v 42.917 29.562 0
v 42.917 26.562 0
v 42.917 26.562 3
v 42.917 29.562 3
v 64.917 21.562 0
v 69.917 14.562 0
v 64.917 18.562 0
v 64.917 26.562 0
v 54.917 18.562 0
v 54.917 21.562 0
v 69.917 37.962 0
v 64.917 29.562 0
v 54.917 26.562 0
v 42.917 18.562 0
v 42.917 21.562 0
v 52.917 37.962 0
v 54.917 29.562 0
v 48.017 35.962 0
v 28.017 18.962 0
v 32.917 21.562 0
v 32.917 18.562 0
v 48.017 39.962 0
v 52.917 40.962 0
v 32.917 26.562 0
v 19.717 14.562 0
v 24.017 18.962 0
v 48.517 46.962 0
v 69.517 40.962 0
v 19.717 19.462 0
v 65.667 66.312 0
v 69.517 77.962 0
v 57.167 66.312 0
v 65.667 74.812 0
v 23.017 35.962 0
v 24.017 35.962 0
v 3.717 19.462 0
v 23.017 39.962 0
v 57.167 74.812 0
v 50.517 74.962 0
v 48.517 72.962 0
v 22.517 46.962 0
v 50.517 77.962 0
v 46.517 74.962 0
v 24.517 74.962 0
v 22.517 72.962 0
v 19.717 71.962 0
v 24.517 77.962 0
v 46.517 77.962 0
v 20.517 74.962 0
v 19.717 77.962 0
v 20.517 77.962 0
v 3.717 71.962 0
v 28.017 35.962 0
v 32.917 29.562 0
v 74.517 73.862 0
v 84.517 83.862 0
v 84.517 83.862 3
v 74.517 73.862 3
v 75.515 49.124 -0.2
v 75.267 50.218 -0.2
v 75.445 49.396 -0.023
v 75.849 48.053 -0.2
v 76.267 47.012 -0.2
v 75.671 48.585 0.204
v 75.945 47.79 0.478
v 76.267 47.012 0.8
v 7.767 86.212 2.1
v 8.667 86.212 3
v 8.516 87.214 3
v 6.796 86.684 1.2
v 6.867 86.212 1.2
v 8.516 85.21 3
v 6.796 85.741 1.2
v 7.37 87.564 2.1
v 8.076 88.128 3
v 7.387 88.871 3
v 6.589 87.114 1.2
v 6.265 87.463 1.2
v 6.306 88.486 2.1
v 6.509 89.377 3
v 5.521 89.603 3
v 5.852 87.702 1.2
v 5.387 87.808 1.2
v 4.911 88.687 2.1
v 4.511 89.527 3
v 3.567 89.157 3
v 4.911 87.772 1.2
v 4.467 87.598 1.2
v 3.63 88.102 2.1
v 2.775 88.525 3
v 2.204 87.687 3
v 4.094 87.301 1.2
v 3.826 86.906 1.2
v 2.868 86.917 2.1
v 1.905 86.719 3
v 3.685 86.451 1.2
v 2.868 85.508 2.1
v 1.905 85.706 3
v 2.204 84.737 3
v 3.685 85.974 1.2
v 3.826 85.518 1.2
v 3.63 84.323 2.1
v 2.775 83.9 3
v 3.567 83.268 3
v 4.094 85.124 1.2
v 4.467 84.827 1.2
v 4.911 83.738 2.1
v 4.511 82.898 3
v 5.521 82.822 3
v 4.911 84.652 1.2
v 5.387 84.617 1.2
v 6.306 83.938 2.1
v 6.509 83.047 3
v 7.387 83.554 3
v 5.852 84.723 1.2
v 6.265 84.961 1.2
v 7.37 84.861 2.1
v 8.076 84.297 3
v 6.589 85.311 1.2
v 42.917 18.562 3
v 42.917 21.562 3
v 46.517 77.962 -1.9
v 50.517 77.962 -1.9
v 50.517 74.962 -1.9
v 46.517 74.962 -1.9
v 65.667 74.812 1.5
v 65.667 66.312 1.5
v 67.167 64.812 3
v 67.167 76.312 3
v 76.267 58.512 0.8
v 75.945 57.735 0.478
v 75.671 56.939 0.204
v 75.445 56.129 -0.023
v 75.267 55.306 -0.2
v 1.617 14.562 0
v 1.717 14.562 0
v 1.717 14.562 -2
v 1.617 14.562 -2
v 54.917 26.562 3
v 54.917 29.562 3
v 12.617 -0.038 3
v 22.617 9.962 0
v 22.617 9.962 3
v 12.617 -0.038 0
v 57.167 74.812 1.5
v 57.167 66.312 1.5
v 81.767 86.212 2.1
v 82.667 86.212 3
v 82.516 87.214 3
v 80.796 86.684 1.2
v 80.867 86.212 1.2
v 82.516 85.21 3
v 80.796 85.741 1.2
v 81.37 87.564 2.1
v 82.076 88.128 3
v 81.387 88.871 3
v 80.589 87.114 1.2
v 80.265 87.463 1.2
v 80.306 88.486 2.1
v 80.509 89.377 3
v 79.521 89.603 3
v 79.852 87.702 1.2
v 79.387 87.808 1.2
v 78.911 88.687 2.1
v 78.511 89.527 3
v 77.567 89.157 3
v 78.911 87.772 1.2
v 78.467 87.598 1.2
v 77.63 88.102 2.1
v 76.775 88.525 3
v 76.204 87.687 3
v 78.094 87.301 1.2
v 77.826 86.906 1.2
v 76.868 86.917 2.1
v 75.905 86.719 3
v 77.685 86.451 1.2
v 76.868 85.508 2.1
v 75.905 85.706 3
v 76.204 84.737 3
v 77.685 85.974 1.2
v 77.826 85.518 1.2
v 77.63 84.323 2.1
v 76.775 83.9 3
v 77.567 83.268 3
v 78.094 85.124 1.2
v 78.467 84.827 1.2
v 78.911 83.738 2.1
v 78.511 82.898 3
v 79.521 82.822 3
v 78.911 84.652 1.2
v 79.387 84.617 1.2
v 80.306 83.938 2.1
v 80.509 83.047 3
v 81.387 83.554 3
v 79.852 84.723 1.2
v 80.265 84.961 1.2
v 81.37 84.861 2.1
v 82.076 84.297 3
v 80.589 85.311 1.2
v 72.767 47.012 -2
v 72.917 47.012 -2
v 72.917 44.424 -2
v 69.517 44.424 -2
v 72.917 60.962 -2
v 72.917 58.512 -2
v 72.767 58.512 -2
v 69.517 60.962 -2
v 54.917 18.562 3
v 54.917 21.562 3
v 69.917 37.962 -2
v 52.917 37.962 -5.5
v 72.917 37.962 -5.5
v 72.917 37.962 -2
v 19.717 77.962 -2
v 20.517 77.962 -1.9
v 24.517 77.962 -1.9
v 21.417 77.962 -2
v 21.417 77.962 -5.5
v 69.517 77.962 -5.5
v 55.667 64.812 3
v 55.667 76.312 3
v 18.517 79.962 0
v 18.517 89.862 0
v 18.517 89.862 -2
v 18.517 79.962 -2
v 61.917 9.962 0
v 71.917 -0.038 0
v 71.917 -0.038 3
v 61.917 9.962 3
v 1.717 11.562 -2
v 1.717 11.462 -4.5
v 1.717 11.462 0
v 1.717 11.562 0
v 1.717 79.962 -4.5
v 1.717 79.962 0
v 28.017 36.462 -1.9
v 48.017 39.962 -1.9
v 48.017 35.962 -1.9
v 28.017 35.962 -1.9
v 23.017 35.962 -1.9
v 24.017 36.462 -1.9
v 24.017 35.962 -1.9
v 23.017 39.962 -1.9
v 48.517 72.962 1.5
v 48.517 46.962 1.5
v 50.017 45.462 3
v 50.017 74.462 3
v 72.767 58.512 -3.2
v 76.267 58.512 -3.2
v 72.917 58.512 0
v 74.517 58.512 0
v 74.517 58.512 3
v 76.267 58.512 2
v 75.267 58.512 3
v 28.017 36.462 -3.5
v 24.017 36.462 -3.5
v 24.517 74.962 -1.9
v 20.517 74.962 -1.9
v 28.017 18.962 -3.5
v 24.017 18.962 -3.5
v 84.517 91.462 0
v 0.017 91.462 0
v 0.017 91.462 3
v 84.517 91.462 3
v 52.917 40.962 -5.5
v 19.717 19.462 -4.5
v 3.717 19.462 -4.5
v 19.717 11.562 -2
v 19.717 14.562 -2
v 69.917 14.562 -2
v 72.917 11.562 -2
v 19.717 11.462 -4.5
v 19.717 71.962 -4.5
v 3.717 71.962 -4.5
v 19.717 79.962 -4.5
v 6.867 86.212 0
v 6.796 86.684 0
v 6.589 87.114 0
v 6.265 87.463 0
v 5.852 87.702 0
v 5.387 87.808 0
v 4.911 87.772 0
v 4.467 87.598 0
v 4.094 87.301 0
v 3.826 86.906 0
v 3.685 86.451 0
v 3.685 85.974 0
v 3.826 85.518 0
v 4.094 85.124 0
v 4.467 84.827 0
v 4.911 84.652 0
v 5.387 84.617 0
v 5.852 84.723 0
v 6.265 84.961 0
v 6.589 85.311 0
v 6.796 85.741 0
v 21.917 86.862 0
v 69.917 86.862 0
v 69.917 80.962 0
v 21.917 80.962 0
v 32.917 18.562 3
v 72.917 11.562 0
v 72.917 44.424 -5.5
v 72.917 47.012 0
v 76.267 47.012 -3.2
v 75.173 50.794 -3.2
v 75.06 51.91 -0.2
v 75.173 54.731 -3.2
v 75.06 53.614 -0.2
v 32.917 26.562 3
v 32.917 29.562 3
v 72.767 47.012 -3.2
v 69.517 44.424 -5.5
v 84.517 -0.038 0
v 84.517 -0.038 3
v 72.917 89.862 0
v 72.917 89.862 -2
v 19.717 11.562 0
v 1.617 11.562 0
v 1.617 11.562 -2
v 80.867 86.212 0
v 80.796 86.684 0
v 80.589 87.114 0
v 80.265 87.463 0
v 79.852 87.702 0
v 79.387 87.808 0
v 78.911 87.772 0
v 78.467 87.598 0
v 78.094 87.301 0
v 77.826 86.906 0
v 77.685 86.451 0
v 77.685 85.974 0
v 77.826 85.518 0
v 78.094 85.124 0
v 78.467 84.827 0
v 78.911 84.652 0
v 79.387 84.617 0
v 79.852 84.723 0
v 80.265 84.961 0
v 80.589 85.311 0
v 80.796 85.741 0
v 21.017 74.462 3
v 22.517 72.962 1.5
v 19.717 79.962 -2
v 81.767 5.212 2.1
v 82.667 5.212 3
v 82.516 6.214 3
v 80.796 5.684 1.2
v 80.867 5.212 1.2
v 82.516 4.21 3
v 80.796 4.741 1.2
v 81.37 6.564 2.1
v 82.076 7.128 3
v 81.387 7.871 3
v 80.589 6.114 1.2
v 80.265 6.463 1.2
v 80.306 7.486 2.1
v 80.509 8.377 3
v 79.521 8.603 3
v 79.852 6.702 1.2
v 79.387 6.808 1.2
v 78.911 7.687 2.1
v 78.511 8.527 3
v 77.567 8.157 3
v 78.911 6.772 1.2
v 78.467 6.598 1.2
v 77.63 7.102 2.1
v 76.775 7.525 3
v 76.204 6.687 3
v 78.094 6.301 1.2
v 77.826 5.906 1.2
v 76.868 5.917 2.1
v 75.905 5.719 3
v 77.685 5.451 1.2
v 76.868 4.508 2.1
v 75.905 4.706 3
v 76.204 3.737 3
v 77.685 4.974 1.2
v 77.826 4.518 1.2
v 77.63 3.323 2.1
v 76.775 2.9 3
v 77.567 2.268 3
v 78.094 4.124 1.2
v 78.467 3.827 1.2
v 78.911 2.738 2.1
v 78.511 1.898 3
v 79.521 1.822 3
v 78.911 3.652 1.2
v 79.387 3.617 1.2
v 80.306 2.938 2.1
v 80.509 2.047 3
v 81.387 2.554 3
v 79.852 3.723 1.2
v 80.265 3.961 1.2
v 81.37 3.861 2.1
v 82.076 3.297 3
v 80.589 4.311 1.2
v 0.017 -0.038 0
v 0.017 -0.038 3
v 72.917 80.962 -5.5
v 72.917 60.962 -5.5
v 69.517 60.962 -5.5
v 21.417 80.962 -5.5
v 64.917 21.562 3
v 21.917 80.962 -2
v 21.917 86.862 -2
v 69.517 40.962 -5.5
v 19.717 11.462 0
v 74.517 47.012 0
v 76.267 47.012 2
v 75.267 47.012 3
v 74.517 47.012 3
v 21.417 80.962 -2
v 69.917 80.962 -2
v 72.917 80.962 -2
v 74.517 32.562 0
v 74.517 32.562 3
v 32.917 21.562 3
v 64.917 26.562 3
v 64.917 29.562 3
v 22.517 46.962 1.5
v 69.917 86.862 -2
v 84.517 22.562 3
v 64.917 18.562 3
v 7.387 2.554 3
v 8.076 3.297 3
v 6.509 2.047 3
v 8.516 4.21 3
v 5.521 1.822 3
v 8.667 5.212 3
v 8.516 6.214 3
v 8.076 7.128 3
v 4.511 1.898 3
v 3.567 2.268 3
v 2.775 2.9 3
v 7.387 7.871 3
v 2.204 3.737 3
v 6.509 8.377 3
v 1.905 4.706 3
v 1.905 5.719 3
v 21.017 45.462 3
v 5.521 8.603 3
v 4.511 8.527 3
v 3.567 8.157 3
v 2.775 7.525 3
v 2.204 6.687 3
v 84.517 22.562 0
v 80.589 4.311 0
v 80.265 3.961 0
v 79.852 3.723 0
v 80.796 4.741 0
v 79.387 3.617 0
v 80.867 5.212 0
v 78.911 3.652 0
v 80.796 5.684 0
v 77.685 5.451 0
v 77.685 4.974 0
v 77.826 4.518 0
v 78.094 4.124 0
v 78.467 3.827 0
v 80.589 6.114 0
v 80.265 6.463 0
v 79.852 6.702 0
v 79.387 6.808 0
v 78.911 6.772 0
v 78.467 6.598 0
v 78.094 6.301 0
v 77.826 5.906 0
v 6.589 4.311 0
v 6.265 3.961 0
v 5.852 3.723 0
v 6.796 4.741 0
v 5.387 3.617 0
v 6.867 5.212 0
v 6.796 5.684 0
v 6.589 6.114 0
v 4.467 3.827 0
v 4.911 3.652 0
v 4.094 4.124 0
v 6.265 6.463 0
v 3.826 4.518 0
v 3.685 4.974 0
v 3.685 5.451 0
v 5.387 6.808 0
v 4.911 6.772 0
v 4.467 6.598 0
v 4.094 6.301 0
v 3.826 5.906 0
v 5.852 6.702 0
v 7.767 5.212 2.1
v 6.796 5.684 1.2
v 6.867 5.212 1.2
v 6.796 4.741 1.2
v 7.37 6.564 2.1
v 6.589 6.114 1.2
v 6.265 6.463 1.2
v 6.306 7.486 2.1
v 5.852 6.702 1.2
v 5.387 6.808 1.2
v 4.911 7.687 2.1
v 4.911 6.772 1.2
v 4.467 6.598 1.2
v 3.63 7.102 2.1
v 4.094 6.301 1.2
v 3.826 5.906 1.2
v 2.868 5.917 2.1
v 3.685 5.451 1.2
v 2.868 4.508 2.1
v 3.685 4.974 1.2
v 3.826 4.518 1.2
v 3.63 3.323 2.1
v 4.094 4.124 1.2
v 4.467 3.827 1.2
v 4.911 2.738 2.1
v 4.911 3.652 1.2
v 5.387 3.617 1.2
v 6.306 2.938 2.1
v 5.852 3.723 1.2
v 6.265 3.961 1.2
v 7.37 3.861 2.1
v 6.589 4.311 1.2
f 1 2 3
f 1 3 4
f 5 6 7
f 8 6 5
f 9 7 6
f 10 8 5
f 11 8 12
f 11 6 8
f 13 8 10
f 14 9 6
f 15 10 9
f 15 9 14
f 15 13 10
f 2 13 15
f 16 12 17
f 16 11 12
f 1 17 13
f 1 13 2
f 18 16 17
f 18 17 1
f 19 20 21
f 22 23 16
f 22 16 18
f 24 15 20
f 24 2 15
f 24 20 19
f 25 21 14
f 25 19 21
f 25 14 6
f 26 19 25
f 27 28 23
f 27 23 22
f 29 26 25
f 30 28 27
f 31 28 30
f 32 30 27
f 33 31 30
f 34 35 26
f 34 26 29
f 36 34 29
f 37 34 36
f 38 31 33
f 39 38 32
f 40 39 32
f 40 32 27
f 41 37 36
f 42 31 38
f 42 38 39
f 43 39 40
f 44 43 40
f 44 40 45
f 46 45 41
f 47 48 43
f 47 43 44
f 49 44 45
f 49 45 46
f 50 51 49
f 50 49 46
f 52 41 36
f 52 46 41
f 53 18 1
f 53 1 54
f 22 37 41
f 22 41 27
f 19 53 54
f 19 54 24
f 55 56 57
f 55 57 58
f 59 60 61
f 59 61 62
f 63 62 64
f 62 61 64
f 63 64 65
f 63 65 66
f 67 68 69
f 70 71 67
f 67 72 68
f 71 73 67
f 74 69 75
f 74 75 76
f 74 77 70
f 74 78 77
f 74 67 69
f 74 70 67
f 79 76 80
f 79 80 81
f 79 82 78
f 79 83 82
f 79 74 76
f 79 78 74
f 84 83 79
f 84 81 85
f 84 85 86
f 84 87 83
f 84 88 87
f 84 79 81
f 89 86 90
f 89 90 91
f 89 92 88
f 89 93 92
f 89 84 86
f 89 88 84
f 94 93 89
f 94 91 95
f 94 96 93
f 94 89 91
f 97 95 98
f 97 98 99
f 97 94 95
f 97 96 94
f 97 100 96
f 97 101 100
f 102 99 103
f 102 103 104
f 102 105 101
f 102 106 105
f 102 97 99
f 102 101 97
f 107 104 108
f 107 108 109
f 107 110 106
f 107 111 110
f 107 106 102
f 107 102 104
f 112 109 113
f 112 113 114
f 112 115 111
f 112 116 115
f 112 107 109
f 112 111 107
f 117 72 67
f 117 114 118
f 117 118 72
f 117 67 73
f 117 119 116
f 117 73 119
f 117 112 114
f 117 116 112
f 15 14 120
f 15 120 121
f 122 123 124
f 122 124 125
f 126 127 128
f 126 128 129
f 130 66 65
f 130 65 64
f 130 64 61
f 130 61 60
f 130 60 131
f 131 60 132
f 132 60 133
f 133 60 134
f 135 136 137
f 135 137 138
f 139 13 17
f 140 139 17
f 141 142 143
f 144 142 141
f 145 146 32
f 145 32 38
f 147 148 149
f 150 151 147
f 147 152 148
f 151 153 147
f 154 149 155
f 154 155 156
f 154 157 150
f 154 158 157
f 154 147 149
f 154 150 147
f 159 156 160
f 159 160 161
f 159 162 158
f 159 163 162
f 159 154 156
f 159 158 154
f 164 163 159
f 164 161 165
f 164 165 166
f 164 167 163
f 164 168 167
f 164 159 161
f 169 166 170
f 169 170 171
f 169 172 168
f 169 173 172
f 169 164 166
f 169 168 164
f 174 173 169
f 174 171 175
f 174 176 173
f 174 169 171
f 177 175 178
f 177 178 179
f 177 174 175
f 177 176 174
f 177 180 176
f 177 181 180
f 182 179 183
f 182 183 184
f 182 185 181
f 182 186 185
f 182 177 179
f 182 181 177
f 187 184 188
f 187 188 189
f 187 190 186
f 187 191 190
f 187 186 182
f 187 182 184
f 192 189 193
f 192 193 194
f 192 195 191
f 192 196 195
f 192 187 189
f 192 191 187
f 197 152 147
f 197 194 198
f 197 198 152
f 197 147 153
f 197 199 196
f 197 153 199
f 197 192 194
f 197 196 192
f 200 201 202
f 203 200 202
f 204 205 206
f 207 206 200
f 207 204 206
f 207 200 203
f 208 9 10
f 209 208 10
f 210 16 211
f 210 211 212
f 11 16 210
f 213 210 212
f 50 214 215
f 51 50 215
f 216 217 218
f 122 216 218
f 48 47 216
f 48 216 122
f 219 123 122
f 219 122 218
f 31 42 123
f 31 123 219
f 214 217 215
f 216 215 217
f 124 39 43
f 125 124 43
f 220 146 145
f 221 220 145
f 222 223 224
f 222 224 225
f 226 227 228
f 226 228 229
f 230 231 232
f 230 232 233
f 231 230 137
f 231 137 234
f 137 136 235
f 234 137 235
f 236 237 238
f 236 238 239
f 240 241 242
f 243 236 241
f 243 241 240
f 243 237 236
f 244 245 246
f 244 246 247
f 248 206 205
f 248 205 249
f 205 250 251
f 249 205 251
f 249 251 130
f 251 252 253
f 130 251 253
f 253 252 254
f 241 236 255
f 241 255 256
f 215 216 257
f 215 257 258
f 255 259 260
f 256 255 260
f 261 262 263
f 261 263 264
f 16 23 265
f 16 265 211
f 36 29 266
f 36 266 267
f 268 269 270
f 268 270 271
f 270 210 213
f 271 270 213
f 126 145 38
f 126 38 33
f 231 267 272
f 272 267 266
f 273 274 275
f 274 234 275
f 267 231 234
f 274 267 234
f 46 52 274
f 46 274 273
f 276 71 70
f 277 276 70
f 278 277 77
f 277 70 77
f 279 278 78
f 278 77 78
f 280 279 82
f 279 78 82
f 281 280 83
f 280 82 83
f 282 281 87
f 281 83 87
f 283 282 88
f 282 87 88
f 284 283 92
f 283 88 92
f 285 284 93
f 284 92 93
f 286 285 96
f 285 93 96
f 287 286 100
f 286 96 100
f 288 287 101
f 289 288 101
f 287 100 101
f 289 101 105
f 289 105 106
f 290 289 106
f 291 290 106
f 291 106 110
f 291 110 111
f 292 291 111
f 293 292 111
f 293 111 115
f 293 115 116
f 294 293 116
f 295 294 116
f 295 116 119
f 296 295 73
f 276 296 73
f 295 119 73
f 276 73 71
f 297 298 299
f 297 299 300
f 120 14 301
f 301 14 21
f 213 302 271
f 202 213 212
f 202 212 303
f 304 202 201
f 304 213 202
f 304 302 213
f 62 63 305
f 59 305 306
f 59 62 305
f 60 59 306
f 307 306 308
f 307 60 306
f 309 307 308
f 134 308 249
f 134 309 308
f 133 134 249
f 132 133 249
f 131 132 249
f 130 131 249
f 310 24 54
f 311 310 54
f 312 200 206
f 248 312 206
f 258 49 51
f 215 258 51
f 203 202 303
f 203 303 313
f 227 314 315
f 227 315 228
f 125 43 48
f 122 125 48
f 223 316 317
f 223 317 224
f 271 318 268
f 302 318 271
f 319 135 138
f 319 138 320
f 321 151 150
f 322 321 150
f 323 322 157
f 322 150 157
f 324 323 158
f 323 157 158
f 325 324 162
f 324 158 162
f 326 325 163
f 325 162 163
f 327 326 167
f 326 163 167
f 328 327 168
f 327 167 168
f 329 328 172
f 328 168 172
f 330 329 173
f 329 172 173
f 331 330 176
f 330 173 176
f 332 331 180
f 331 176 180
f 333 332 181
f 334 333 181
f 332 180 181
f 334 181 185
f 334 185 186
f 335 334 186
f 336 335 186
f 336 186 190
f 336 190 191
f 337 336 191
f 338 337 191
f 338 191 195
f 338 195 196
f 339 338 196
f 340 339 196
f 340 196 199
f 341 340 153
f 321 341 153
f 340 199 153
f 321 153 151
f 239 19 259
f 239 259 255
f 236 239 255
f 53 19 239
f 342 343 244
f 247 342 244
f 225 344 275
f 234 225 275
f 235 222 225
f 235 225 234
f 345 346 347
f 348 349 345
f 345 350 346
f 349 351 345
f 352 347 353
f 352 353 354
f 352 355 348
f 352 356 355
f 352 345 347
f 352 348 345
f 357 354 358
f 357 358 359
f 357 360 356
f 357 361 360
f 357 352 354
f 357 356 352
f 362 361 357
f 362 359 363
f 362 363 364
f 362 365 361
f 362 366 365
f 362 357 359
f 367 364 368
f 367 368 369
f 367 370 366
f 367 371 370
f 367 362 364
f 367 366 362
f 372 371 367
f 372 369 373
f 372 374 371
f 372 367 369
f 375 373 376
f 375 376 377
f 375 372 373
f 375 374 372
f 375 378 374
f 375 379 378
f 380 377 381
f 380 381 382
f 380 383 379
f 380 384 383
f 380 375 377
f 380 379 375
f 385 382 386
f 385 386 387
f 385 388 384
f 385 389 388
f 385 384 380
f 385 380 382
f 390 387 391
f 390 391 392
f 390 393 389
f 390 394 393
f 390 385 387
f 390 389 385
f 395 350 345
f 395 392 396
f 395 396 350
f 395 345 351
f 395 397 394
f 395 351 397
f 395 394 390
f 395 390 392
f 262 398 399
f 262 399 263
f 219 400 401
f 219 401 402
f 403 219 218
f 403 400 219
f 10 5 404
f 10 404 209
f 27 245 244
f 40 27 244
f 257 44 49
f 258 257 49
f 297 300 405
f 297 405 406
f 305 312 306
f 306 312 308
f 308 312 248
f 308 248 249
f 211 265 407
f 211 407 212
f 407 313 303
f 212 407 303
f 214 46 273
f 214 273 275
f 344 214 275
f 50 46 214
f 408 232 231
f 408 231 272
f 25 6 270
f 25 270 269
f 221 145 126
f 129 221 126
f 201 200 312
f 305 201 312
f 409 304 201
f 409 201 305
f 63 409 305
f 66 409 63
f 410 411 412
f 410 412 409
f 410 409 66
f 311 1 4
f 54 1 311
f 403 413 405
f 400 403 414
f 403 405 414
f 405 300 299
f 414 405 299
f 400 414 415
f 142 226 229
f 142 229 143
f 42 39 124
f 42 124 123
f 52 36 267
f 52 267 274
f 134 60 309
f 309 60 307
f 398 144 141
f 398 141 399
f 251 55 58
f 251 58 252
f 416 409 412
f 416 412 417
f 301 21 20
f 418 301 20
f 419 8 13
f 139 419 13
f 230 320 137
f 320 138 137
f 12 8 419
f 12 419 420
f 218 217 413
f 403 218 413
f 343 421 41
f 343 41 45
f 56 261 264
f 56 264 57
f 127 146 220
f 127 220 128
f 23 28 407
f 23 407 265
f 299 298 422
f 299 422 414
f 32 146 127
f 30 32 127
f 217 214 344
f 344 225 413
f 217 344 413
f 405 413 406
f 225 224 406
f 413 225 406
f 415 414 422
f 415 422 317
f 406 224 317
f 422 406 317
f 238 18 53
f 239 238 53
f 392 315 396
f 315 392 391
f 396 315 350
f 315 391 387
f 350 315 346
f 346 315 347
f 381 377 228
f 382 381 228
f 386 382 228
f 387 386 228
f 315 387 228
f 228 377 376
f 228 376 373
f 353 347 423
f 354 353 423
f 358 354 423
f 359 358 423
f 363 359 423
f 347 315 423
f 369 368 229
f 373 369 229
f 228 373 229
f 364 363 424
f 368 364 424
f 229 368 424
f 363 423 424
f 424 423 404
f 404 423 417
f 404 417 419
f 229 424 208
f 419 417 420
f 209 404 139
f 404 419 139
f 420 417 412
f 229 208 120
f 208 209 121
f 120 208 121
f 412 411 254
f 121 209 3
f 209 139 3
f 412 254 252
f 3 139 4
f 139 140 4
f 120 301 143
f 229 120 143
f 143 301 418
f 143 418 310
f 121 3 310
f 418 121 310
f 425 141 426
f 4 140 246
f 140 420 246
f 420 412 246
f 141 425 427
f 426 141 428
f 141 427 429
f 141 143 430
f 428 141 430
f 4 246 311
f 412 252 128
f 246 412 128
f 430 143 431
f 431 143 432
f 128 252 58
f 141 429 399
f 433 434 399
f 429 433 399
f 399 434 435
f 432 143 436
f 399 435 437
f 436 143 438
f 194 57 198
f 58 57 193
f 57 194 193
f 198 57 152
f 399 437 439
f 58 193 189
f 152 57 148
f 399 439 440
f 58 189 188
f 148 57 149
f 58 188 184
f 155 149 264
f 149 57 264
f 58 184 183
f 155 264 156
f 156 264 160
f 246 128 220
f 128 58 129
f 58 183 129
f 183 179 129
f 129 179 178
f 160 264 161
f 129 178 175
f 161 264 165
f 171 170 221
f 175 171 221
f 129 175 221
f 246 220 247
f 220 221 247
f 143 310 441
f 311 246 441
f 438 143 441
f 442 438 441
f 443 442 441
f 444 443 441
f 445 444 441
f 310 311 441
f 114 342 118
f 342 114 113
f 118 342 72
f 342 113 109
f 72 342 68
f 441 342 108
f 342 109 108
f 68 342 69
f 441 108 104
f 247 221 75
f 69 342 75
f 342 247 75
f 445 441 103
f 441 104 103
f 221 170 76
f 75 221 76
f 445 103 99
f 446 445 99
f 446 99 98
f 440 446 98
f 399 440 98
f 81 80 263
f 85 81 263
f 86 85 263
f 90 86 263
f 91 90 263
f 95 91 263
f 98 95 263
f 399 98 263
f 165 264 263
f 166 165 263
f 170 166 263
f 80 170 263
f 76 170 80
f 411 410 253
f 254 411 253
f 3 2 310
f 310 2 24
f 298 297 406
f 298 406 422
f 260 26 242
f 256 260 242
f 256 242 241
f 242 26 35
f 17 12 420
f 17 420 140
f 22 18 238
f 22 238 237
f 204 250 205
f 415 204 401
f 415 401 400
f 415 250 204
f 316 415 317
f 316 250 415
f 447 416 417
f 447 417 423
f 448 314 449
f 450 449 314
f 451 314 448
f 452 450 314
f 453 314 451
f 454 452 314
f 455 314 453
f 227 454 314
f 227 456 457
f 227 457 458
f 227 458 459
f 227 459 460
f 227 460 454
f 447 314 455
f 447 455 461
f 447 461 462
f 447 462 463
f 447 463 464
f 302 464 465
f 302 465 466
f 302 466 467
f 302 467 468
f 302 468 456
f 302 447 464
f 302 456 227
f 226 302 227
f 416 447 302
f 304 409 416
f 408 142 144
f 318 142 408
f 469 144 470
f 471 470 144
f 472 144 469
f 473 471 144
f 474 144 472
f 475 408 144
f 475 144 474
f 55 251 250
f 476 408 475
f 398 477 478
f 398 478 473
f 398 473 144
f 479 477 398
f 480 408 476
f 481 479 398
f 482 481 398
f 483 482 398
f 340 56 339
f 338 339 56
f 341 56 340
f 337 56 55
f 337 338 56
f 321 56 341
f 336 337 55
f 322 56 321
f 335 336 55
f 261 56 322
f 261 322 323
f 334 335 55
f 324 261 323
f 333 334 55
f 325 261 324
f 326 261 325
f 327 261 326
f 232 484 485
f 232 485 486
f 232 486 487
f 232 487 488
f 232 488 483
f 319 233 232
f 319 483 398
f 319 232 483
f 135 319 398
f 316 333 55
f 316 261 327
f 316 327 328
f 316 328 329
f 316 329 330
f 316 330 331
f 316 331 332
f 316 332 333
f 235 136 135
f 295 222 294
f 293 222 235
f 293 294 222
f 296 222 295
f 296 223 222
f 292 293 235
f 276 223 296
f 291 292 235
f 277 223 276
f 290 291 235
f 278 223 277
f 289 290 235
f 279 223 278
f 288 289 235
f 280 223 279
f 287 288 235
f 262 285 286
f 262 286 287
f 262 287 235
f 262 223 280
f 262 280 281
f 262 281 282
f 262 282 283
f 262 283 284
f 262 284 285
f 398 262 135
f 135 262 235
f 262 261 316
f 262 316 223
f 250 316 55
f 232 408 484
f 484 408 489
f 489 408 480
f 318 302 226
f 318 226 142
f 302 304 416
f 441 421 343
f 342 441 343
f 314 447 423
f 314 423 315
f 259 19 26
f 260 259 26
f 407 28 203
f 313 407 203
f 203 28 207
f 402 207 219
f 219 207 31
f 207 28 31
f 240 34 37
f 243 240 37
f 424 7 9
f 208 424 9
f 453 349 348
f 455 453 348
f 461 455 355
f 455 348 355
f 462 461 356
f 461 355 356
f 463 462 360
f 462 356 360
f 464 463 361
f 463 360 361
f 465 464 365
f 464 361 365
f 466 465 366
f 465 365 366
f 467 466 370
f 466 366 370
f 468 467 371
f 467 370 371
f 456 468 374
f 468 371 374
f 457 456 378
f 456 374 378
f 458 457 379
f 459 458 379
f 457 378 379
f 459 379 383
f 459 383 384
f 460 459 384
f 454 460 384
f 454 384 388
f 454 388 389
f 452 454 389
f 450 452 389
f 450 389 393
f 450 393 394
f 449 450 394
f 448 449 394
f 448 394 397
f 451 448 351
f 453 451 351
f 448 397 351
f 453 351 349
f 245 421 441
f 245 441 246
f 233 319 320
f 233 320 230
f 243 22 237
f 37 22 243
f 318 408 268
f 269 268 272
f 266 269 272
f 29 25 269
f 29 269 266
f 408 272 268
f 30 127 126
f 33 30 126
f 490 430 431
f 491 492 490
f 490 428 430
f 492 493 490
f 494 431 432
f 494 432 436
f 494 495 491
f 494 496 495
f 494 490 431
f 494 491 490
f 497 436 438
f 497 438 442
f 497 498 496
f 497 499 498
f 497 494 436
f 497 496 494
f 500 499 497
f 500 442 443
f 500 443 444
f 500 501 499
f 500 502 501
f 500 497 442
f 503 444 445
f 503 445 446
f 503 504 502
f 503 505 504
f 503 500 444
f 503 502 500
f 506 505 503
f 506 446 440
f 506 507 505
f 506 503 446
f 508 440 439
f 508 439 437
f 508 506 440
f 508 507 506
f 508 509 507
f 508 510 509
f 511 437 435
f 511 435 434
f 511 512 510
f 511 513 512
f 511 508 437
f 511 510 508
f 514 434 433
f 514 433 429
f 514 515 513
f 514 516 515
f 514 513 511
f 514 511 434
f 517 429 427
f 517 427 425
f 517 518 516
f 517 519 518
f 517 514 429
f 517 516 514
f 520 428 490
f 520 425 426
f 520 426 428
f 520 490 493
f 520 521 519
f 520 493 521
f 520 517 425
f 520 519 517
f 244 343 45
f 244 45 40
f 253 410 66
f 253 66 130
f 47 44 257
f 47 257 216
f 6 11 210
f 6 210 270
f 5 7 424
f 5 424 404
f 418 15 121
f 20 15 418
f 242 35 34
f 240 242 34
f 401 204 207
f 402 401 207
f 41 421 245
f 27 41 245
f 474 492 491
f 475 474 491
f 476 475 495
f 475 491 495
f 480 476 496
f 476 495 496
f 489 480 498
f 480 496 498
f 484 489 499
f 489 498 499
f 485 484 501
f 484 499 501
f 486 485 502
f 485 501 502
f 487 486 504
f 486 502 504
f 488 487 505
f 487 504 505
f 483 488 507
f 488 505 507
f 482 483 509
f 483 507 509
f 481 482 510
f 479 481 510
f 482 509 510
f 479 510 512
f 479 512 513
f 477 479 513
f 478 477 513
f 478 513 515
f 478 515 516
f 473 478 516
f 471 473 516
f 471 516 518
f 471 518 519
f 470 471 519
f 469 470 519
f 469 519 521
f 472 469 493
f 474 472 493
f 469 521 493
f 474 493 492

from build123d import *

# Parameters (mm, degrees)
BOSS_EXTRUDE1_DEPTH     = 3
SKETCH3_R               = 1.6
CUT_EXTRUDE1_DEPTH      = 3
CHAMFER1_SIZE           = 1.8
SKETCH5_W               = 26
SKETCH5_H               = 26
SKETCH5_W_2             = 8.5
SKETCH5_H_2             = 8.5
CUT_EXTRUDE2_DEPTH      = 3
CHAMFER2_SIZE           = 1.5
SKETCH7_W               = 3.5
SKETCH7_H               = 11.5
BOSS_EXTRUDE3_DEPTH     = 6.2
CUT_EXTRUDE3_DEPTH      = 125.687357779
CUT_EXTRUDE3_DEPTH_BACK = 3
CHAMFER3_SIZE           = 1
SKETCH9_W               = 25
SKETCH9_H               = 4
SKETCH9_W_2             = 4
SKETCH9_H_2             = 5
BOSS_EXTRUDE4_DEPTH     = 1.9
BOSS_EXTRUDE5_DEPTH     = 5.5
SKETCH11_W              = 4
SKETCH11_H              = 17.5
BOSS_EXTRUDE6_DEPTH     = 3.5
BOSS_EXTRUDE7_DEPTH     = 4.5
SKETCH13_W              = 3.4
SKETCH13_H              = 16.58647312
BOSS_EXTRUDE8_DEPTH     = 2
SKETCH14_W              = 10
SKETCH14_H              = 3
CUT_EXTRUDE4_DEPTH      = 3
CHAMFER4_SIZE           = 1


with BuildPart() as part:
    # Sketch1 → Boss-Extrude1 (new body)
    with BuildSketch(Plane.XY):
        Polygon((0.01715505, 91.462274694), (84.51715505, 91.462274694), (84.51715505, 83.862274694), (74.51715505, 73.862274694), (74.51715505, 32.562274694), (84.51715505, 22.562274694), (84.51715505, -0.037725306), (71.91715505, -0.037725306), (61.91715505, 9.962274694), (22.61715505, 9.962274694), (12.61715505, -0.037725306), (0.01715505, -0.037725306), align=None)
    extrude(amount=BOSS_EXTRUDE1_DEPTH)

    # Sketch3 → Cut-Extrude1 (cut)
    with BuildSketch(Plane.XY.offset(3)):
        with Locations((5.26715505, 86.212274694)):
            Circle(SKETCH3_R)
        with Locations((79.26715505, 86.212274694)):
            Circle(SKETCH3_R)
        with Locations((5.26715505, 5.212274694)):
            Circle(SKETCH3_R)
        with Locations((79.26715505, 5.212274694)):
            Circle(SKETCH3_R)
    extrude(amount=-CUT_EXTRUDE1_DEPTH, mode=Mode.SUBTRACT)

    # Chamfer1
    chamfer1_edges = [part.edges().sort_by_distance(p)[0] for p in [
        (77.66715505, 86.212274694, 3),
        (3.66715505, 5.212274694, 3),
        (77.66715505, 5.212274694, 3),
        (3.66715505, 86.212274694, 3),
    ]]
    chamfer(chamfer1_edges, length=CHAMFER1_SIZE)

    # Sketch5 → Cut-Extrude2 (cut)
    with BuildSketch(Plane.XY.offset(3)):
        with Locations((35.51715505, 59.962274694)):
            Rectangle(SKETCH5_W, SKETCH5_H)
        with Locations((61.41715505, 70.562274694)):
            Rectangle(SKETCH5_W_2, SKETCH5_H_2)
    extrude(amount=-CUT_EXTRUDE2_DEPTH, mode=Mode.SUBTRACT)

    # Chamfer2
    chamfer2_edges = [part.edges().sort_by_distance(p)[0] for p in [
        (57.16715505, 70.562274694, 3),
        (61.41715505, 66.312274694, 3),
        (65.66715505, 70.562274694, 3),
        (61.41715505, 74.812274694, 3),
        (22.51715505, 59.962274694, 3),
        (35.51715505, 46.962274694, 3),
        (48.51715505, 59.962274694, 3),
        (35.51715505, 72.962274694, 3),
    ]]
    chamfer(chamfer2_edges, length=CHAMFER2_SIZE)

    # Sketch7 → Boss-Extrude3 (add)
    with BuildSketch(Plane.XY.offset(3)):
        with Locations((74.51715505, 52.762274694)):
            Rectangle(SKETCH7_W, SKETCH7_H)
    extrude(amount=-BOSS_EXTRUDE3_DEPTH)

    # Sketch8 → Cut-Extrude3 (cut, two sides: drawn at the far end of the back side and taken through both)
    with BuildSketch(Plane(origin=(0, 0, -3.2), x_dir=(-1, 0, 0), z_dir=(0, 0, -1)).offset(-CUT_EXTRUDE3_DEPTH_BACK)):
        with BuildLine():
            Line((-76.26715505, 58.512274694), (-76.26715505, 47.012274694))
            ThreePointArc((-76.26715505, 47.012274694), (-75.034557132, 52.762274694), (-76.26715505, 58.512274694))
        make_face()
    extrude(amount=CUT_EXTRUDE3_DEPTH + CUT_EXTRUDE3_DEPTH_BACK, mode=Mode.SUBTRACT)

    # Chamfer3
    # the kernel refuses this chamfer: 1 mm, written as the material it takes off along each edge
    with BuildSketch(Plane(origin=(76.26715505, 61.083957682, -0.2), x_dir=(0.02749587661058217, 0, 0.9996219169112968), z_dir=(0, -1, 0))) as chamfer3_piece_1_section:
        Polygon((CHAMFER3_SIZE * 0.999621916911, CHAMFER3_SIZE * 0.0274958766106), (-CHAMFER3_SIZE * 0.0274958766106, CHAMFER3_SIZE * 0.999621916911), (0, 0), align=None)
    chamfer3_piece_1 = extrude(amount=16.643365976, mode=Mode.PRIVATE)
    chamfer3_piece_1 = chamfer3_piece_1 & Plane(origin=(89.06256948, 52.762274694, 0.149616296), x_dir=(-0.9121331028647569, -0.4098941359159838, 0), z_dir=(0, 0, 1)) * Cylinder(14.028012348, 38, mode=Mode.PRIVATE)
    add(chamfer3_piece_1, mode=Mode.SUBTRACT)

    # Sketch9 → Boss-Extrude4 (add)
    with BuildSketch(Plane(origin=(0, 0, 0), x_dir=(-1, 0, 0), z_dir=(0, 0, -1))):
        with Locations((-35.51715505, 37.962274694)):
            Rectangle(SKETCH9_W, SKETCH9_H)
        with Locations((-48.51715505, 77.462274694)):
            Rectangle(SKETCH9_W_2, SKETCH9_H_2)
        with Locations((-22.51715505, 77.462274694)):
            Rectangle(SKETCH9_W_2, SKETCH9_H_2)
    extrude(amount=BOSS_EXTRUDE4_DEPTH)

    # Sketch10 → Boss-Extrude5 (add)
    with BuildSketch(Plane(origin=(0, 0, 0), x_dir=(-1, 0, 0), z_dir=(0, 0, -1))):
        Polygon((-21.41715505, 80.962274694), (-72.91715505, 80.962274694), (-72.91715505, 60.962274694), (-69.51715505, 60.962274694), (-69.51715505, 77.962274694), (-21.41715505, 77.962274694), align=None)
        Polygon((-72.91715505, 44.424333564), (-69.51715505, 44.424333564), (-69.51715505, 40.962274694), (-52.91715505, 40.962274694), (-52.91715505, 37.962274694), (-72.91715505, 37.962274694), align=None)
    extrude(amount=BOSS_EXTRUDE5_DEPTH)

    # Sketch11 → Boss-Extrude6 (add)
    with BuildSketch(Plane(origin=(0, 0, 0), x_dir=(-1, 0, 0), z_dir=(0, 0, -1))):
        with Locations((-26.01715505, 27.712274694)):
            Rectangle(SKETCH11_W, SKETCH11_H)
    extrude(amount=BOSS_EXTRUDE6_DEPTH)

    # Sketch12 → Boss-Extrude7 (add)
    with BuildSketch(Plane(origin=(0, 0, 0), x_dir=(-1, 0, 0), z_dir=(0, 0, -1))):
        Polygon((-19.71715505, 79.962274694), (-1.71715505, 79.962274694), (-1.71715505, 72.462274694), (-1.71715505, 19.462274694), (-1.71715505, 11.462274694), (-19.71715505, 11.462274694), (-19.71715505, 19.462274694), (-3.71715505, 19.462274694), (-3.71715505, 71.962274694), (-19.71715505, 71.962274694), align=None)
    extrude(amount=BOSS_EXTRUDE7_DEPTH)

    # Sketch13 → Boss-Extrude8 (add)
    with BuildSketch(Plane(origin=(0, 0, 0), x_dir=(-1, 0, 0), z_dir=(0, 0, -1))):
        Polygon((-18.51715505, 77.962274694), (-21.91715505, 77.962274694), (-21.91715505, 86.862274694), (-69.91715505, 86.862274694), (-69.91715505, 80.962274694), (-72.91715505, 80.962274694), (-72.91715505, 89.862274694), (-18.51715505, 89.862274694), align=None)
        Polygon((-72.91715505, 37.962274694), (-69.91715505, 37.962274694), (-69.91715505, 14.562274694), (-1.61715505, 14.562274694), (-1.61715505, 11.562274694), (-72.91715505, 11.562274694), align=None)
        with Locations((-71.21715505, 52.669038134)):
            Rectangle(SKETCH13_W, SKETCH13_H)
    extrude(amount=BOSS_EXTRUDE8_DEPTH)

    # Sketch14 → Cut-Extrude4 (cut)
    with BuildSketch(Plane(origin=(0, 0, 0), x_dir=(-1, 0, 0), z_dir=(0, 0, -1))):
        with Locations((-37.91715505, 20.062274694)):
            Rectangle(SKETCH14_W, SKETCH14_H)
        with Locations((-59.91715505, 20.062274694)):
            Rectangle(SKETCH14_W, SKETCH14_H)
        with Locations((-37.91715505, 28.062274694)):
            Rectangle(SKETCH14_W, SKETCH14_H)
        with Locations((-59.91715505, 28.062274694)):
            Rectangle(SKETCH14_W, SKETCH14_H)
    extrude(amount=-CUT_EXTRUDE4_DEPTH, mode=Mode.SUBTRACT)

    # Chamfer4
    chamfer4_edges = [part.edges().sort_by_distance(p)[0] for p in [
        (76.26715505, 52.762274694, 3),
    ]]
    chamfer(chamfer4_edges, length=CHAMFER4_SIZE)


solid = part.part
